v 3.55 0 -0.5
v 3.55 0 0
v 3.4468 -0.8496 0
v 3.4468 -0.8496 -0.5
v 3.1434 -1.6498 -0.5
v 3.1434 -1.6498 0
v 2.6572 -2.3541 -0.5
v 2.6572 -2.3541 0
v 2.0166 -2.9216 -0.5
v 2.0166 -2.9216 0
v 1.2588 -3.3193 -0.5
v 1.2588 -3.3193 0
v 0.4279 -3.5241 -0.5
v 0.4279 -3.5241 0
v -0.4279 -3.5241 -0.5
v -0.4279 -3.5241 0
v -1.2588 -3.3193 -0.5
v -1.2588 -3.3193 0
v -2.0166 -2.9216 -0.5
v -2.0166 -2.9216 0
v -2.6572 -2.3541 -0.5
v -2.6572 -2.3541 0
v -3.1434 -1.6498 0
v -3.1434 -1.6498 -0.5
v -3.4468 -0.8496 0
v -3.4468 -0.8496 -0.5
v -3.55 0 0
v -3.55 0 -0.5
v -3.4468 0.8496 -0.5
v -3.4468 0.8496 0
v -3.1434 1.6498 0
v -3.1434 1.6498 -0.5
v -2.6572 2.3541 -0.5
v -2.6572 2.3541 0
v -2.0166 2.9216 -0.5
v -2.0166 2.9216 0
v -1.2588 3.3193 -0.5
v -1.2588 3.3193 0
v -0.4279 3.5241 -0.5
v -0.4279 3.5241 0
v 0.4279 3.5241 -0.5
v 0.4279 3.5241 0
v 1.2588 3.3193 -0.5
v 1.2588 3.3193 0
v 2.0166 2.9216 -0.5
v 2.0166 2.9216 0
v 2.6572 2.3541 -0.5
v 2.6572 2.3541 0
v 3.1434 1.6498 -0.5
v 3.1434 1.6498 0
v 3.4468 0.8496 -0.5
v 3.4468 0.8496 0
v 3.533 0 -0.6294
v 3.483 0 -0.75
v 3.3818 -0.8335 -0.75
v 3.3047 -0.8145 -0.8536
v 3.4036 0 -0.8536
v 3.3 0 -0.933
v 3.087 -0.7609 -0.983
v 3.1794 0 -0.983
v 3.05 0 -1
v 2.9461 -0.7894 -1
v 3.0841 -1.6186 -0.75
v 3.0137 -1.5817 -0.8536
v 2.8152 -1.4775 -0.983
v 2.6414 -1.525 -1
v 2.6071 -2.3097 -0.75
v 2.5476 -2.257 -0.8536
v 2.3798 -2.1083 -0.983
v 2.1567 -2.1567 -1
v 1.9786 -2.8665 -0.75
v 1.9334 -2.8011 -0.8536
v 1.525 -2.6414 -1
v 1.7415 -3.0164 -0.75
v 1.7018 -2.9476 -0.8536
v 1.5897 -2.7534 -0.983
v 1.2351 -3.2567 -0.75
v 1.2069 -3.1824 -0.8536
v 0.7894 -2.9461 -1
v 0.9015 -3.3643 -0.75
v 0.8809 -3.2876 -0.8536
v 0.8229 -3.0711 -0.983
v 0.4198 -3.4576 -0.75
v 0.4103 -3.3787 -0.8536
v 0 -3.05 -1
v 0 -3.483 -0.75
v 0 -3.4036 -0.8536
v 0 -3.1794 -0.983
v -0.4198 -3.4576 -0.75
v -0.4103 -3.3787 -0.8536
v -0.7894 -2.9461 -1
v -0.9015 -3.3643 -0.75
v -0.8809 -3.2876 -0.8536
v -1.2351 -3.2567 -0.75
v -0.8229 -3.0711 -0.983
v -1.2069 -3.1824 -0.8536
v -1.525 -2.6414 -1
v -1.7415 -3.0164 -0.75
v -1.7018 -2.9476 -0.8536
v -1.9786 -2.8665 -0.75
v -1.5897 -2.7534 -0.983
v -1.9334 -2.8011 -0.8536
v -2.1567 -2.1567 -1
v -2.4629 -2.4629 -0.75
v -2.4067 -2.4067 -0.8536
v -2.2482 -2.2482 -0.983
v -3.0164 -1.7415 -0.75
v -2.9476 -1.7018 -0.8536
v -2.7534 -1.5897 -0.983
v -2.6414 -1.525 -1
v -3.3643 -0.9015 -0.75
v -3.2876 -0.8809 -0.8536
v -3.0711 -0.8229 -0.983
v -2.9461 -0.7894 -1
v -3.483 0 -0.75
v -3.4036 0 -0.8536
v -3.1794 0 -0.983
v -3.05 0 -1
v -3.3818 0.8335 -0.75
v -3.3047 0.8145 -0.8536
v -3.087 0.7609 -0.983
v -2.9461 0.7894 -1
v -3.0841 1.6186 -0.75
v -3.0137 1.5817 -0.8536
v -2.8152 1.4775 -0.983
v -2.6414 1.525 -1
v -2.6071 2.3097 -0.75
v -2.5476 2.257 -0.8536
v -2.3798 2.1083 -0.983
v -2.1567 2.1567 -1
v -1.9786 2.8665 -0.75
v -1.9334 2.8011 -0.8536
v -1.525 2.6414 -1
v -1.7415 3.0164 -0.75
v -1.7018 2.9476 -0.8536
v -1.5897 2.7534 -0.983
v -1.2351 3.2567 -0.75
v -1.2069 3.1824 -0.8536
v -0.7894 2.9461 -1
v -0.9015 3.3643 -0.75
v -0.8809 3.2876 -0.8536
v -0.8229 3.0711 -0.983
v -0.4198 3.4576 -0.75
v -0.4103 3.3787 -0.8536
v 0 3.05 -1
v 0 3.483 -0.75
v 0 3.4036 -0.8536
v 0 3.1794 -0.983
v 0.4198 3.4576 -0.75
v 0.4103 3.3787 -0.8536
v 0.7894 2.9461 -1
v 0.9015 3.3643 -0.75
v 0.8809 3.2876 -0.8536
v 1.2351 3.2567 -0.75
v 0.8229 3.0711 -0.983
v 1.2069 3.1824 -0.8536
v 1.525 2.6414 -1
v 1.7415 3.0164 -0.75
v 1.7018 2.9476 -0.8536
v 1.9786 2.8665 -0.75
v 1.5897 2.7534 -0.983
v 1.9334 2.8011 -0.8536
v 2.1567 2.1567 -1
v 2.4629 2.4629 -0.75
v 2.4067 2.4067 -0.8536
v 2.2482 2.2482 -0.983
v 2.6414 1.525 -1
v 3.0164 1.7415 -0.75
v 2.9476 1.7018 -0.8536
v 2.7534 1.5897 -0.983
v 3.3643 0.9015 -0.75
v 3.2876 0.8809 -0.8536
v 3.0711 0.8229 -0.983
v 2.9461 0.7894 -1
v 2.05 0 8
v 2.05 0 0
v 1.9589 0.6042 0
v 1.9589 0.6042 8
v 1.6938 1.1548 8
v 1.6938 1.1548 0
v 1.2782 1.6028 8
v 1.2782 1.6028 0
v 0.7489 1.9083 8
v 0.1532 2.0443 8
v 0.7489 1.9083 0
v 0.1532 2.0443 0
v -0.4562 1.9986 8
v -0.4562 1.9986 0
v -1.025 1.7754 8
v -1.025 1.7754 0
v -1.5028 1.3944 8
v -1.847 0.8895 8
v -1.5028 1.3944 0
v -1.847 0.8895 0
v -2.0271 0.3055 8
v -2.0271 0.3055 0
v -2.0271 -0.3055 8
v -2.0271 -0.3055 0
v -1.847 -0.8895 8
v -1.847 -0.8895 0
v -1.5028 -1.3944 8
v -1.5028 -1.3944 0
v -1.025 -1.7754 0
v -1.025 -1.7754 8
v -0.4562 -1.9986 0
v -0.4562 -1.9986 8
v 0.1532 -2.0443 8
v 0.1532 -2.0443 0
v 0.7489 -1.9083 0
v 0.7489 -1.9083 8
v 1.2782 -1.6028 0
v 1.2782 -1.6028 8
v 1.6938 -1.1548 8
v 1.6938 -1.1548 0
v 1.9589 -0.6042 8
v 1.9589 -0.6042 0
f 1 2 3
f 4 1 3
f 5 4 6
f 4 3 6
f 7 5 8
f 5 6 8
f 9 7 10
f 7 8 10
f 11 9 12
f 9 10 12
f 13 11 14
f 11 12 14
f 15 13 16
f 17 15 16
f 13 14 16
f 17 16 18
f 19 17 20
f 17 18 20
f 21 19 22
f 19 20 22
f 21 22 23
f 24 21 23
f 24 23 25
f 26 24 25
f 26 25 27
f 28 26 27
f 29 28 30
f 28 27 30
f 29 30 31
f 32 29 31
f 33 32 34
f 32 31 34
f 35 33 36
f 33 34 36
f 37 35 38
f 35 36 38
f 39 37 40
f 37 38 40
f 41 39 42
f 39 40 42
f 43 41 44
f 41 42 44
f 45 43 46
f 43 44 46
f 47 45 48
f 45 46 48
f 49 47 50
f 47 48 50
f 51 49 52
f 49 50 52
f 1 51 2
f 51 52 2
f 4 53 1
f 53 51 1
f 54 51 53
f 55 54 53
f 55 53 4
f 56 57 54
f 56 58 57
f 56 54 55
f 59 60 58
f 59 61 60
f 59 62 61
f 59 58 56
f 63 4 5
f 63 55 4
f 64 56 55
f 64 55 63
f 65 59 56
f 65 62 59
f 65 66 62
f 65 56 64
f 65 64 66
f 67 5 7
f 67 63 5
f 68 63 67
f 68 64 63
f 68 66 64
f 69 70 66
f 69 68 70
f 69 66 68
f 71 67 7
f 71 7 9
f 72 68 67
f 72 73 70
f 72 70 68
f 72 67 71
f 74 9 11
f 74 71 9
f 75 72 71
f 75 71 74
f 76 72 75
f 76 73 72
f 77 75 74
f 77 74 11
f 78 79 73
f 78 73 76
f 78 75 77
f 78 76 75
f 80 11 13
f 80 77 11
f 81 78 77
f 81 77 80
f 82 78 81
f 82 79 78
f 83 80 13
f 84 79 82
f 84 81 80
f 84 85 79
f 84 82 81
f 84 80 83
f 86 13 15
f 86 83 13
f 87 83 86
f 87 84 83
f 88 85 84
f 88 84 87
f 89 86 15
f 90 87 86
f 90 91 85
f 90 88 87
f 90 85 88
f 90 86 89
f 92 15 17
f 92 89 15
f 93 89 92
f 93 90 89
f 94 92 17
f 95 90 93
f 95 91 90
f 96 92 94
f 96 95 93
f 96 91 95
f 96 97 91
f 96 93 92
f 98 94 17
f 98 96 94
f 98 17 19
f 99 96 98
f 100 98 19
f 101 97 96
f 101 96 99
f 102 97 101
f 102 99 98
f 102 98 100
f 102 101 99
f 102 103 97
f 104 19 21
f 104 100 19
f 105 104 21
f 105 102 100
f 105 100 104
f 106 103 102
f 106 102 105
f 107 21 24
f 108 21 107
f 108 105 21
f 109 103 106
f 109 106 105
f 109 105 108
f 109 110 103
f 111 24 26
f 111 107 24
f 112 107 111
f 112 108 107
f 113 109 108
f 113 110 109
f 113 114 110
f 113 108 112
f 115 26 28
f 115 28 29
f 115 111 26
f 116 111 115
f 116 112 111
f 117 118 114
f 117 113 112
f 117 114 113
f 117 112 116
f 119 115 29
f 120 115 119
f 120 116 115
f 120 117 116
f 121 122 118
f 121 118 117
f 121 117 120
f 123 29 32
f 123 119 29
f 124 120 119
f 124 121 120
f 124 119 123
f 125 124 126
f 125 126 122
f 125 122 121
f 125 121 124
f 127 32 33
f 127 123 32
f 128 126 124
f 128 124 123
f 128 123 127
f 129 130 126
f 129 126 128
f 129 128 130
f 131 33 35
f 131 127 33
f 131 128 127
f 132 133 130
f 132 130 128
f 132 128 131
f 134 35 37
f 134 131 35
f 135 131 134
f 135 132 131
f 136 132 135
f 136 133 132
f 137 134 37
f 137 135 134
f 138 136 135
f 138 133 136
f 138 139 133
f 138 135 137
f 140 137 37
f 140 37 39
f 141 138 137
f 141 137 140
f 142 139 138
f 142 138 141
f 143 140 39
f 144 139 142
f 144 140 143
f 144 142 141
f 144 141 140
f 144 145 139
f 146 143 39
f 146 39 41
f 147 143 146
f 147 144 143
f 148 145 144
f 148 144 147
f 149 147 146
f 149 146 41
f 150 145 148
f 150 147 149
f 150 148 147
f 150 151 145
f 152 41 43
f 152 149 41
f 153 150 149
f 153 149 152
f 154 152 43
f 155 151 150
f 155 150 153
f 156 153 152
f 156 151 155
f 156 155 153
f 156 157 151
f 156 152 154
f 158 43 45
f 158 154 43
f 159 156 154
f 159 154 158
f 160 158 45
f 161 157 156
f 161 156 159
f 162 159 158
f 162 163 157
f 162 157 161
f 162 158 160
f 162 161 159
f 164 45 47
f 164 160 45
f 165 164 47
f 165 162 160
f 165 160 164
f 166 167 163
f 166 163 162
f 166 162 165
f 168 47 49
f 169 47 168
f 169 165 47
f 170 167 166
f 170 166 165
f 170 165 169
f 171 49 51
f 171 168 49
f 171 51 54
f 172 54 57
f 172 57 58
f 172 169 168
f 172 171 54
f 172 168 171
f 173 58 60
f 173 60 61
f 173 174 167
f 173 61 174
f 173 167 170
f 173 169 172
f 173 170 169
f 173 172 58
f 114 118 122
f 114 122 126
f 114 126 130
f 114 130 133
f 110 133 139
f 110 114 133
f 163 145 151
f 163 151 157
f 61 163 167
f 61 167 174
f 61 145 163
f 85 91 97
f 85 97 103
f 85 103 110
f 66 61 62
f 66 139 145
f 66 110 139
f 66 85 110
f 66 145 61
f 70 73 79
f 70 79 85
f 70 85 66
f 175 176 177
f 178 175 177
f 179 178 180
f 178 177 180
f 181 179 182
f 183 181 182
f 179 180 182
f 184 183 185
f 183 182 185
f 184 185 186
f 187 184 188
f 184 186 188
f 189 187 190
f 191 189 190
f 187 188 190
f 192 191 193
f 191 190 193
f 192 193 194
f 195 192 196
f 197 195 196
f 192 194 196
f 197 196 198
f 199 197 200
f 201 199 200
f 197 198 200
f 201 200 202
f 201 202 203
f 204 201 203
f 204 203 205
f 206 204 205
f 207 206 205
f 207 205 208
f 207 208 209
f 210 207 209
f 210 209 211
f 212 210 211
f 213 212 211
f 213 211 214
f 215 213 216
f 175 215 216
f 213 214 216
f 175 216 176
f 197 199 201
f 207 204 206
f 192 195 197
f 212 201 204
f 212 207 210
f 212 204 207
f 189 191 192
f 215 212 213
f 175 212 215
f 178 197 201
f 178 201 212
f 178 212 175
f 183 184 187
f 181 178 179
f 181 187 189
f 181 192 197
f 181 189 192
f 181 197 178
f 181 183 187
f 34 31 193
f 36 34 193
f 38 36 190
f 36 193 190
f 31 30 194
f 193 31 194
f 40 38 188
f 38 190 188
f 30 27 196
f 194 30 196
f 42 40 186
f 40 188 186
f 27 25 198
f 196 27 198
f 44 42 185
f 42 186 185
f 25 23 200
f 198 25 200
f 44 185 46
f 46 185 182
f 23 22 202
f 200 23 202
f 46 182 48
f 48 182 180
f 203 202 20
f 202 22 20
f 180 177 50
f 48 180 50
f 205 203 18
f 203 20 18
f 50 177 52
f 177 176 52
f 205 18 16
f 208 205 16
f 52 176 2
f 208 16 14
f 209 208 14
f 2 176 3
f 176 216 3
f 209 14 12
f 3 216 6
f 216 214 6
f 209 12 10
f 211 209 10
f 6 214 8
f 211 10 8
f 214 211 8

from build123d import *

# Parameters (mm, degrees)
F0_R     = 2.05
F1_DEPTH = 8
F2_R     = 3.55
F2_R_2   = 2.05
F3_DEPTH = 1
F4_R     = 0.5


with BuildPart() as f1:
    # F0 (on Top) → F1 (new body)
    with BuildSketch(Plane.XY):
        Circle(F0_R)
    extrude(amount=F1_DEPTH)

    # F2 (on face) → F3 (join)
    with BuildSketch(Plane(origin=(0, 0, 0), x_dir=(1, 0, 0), z_dir=(0, 0, -1))):
        Circle(F2_R)
        Circle(F2_R_2, mode=Mode.SUBTRACT)
        Circle(F2_R_2)
    extrude(amount=F3_DEPTH)

    # F4
    f4_edges = [f1.edges().sort_by_distance(p)[0] for p in [
        (-3.55, 0, -1),
    ]]
    fillet(f4_edges, radius=F4_R)


solid = f1.part
